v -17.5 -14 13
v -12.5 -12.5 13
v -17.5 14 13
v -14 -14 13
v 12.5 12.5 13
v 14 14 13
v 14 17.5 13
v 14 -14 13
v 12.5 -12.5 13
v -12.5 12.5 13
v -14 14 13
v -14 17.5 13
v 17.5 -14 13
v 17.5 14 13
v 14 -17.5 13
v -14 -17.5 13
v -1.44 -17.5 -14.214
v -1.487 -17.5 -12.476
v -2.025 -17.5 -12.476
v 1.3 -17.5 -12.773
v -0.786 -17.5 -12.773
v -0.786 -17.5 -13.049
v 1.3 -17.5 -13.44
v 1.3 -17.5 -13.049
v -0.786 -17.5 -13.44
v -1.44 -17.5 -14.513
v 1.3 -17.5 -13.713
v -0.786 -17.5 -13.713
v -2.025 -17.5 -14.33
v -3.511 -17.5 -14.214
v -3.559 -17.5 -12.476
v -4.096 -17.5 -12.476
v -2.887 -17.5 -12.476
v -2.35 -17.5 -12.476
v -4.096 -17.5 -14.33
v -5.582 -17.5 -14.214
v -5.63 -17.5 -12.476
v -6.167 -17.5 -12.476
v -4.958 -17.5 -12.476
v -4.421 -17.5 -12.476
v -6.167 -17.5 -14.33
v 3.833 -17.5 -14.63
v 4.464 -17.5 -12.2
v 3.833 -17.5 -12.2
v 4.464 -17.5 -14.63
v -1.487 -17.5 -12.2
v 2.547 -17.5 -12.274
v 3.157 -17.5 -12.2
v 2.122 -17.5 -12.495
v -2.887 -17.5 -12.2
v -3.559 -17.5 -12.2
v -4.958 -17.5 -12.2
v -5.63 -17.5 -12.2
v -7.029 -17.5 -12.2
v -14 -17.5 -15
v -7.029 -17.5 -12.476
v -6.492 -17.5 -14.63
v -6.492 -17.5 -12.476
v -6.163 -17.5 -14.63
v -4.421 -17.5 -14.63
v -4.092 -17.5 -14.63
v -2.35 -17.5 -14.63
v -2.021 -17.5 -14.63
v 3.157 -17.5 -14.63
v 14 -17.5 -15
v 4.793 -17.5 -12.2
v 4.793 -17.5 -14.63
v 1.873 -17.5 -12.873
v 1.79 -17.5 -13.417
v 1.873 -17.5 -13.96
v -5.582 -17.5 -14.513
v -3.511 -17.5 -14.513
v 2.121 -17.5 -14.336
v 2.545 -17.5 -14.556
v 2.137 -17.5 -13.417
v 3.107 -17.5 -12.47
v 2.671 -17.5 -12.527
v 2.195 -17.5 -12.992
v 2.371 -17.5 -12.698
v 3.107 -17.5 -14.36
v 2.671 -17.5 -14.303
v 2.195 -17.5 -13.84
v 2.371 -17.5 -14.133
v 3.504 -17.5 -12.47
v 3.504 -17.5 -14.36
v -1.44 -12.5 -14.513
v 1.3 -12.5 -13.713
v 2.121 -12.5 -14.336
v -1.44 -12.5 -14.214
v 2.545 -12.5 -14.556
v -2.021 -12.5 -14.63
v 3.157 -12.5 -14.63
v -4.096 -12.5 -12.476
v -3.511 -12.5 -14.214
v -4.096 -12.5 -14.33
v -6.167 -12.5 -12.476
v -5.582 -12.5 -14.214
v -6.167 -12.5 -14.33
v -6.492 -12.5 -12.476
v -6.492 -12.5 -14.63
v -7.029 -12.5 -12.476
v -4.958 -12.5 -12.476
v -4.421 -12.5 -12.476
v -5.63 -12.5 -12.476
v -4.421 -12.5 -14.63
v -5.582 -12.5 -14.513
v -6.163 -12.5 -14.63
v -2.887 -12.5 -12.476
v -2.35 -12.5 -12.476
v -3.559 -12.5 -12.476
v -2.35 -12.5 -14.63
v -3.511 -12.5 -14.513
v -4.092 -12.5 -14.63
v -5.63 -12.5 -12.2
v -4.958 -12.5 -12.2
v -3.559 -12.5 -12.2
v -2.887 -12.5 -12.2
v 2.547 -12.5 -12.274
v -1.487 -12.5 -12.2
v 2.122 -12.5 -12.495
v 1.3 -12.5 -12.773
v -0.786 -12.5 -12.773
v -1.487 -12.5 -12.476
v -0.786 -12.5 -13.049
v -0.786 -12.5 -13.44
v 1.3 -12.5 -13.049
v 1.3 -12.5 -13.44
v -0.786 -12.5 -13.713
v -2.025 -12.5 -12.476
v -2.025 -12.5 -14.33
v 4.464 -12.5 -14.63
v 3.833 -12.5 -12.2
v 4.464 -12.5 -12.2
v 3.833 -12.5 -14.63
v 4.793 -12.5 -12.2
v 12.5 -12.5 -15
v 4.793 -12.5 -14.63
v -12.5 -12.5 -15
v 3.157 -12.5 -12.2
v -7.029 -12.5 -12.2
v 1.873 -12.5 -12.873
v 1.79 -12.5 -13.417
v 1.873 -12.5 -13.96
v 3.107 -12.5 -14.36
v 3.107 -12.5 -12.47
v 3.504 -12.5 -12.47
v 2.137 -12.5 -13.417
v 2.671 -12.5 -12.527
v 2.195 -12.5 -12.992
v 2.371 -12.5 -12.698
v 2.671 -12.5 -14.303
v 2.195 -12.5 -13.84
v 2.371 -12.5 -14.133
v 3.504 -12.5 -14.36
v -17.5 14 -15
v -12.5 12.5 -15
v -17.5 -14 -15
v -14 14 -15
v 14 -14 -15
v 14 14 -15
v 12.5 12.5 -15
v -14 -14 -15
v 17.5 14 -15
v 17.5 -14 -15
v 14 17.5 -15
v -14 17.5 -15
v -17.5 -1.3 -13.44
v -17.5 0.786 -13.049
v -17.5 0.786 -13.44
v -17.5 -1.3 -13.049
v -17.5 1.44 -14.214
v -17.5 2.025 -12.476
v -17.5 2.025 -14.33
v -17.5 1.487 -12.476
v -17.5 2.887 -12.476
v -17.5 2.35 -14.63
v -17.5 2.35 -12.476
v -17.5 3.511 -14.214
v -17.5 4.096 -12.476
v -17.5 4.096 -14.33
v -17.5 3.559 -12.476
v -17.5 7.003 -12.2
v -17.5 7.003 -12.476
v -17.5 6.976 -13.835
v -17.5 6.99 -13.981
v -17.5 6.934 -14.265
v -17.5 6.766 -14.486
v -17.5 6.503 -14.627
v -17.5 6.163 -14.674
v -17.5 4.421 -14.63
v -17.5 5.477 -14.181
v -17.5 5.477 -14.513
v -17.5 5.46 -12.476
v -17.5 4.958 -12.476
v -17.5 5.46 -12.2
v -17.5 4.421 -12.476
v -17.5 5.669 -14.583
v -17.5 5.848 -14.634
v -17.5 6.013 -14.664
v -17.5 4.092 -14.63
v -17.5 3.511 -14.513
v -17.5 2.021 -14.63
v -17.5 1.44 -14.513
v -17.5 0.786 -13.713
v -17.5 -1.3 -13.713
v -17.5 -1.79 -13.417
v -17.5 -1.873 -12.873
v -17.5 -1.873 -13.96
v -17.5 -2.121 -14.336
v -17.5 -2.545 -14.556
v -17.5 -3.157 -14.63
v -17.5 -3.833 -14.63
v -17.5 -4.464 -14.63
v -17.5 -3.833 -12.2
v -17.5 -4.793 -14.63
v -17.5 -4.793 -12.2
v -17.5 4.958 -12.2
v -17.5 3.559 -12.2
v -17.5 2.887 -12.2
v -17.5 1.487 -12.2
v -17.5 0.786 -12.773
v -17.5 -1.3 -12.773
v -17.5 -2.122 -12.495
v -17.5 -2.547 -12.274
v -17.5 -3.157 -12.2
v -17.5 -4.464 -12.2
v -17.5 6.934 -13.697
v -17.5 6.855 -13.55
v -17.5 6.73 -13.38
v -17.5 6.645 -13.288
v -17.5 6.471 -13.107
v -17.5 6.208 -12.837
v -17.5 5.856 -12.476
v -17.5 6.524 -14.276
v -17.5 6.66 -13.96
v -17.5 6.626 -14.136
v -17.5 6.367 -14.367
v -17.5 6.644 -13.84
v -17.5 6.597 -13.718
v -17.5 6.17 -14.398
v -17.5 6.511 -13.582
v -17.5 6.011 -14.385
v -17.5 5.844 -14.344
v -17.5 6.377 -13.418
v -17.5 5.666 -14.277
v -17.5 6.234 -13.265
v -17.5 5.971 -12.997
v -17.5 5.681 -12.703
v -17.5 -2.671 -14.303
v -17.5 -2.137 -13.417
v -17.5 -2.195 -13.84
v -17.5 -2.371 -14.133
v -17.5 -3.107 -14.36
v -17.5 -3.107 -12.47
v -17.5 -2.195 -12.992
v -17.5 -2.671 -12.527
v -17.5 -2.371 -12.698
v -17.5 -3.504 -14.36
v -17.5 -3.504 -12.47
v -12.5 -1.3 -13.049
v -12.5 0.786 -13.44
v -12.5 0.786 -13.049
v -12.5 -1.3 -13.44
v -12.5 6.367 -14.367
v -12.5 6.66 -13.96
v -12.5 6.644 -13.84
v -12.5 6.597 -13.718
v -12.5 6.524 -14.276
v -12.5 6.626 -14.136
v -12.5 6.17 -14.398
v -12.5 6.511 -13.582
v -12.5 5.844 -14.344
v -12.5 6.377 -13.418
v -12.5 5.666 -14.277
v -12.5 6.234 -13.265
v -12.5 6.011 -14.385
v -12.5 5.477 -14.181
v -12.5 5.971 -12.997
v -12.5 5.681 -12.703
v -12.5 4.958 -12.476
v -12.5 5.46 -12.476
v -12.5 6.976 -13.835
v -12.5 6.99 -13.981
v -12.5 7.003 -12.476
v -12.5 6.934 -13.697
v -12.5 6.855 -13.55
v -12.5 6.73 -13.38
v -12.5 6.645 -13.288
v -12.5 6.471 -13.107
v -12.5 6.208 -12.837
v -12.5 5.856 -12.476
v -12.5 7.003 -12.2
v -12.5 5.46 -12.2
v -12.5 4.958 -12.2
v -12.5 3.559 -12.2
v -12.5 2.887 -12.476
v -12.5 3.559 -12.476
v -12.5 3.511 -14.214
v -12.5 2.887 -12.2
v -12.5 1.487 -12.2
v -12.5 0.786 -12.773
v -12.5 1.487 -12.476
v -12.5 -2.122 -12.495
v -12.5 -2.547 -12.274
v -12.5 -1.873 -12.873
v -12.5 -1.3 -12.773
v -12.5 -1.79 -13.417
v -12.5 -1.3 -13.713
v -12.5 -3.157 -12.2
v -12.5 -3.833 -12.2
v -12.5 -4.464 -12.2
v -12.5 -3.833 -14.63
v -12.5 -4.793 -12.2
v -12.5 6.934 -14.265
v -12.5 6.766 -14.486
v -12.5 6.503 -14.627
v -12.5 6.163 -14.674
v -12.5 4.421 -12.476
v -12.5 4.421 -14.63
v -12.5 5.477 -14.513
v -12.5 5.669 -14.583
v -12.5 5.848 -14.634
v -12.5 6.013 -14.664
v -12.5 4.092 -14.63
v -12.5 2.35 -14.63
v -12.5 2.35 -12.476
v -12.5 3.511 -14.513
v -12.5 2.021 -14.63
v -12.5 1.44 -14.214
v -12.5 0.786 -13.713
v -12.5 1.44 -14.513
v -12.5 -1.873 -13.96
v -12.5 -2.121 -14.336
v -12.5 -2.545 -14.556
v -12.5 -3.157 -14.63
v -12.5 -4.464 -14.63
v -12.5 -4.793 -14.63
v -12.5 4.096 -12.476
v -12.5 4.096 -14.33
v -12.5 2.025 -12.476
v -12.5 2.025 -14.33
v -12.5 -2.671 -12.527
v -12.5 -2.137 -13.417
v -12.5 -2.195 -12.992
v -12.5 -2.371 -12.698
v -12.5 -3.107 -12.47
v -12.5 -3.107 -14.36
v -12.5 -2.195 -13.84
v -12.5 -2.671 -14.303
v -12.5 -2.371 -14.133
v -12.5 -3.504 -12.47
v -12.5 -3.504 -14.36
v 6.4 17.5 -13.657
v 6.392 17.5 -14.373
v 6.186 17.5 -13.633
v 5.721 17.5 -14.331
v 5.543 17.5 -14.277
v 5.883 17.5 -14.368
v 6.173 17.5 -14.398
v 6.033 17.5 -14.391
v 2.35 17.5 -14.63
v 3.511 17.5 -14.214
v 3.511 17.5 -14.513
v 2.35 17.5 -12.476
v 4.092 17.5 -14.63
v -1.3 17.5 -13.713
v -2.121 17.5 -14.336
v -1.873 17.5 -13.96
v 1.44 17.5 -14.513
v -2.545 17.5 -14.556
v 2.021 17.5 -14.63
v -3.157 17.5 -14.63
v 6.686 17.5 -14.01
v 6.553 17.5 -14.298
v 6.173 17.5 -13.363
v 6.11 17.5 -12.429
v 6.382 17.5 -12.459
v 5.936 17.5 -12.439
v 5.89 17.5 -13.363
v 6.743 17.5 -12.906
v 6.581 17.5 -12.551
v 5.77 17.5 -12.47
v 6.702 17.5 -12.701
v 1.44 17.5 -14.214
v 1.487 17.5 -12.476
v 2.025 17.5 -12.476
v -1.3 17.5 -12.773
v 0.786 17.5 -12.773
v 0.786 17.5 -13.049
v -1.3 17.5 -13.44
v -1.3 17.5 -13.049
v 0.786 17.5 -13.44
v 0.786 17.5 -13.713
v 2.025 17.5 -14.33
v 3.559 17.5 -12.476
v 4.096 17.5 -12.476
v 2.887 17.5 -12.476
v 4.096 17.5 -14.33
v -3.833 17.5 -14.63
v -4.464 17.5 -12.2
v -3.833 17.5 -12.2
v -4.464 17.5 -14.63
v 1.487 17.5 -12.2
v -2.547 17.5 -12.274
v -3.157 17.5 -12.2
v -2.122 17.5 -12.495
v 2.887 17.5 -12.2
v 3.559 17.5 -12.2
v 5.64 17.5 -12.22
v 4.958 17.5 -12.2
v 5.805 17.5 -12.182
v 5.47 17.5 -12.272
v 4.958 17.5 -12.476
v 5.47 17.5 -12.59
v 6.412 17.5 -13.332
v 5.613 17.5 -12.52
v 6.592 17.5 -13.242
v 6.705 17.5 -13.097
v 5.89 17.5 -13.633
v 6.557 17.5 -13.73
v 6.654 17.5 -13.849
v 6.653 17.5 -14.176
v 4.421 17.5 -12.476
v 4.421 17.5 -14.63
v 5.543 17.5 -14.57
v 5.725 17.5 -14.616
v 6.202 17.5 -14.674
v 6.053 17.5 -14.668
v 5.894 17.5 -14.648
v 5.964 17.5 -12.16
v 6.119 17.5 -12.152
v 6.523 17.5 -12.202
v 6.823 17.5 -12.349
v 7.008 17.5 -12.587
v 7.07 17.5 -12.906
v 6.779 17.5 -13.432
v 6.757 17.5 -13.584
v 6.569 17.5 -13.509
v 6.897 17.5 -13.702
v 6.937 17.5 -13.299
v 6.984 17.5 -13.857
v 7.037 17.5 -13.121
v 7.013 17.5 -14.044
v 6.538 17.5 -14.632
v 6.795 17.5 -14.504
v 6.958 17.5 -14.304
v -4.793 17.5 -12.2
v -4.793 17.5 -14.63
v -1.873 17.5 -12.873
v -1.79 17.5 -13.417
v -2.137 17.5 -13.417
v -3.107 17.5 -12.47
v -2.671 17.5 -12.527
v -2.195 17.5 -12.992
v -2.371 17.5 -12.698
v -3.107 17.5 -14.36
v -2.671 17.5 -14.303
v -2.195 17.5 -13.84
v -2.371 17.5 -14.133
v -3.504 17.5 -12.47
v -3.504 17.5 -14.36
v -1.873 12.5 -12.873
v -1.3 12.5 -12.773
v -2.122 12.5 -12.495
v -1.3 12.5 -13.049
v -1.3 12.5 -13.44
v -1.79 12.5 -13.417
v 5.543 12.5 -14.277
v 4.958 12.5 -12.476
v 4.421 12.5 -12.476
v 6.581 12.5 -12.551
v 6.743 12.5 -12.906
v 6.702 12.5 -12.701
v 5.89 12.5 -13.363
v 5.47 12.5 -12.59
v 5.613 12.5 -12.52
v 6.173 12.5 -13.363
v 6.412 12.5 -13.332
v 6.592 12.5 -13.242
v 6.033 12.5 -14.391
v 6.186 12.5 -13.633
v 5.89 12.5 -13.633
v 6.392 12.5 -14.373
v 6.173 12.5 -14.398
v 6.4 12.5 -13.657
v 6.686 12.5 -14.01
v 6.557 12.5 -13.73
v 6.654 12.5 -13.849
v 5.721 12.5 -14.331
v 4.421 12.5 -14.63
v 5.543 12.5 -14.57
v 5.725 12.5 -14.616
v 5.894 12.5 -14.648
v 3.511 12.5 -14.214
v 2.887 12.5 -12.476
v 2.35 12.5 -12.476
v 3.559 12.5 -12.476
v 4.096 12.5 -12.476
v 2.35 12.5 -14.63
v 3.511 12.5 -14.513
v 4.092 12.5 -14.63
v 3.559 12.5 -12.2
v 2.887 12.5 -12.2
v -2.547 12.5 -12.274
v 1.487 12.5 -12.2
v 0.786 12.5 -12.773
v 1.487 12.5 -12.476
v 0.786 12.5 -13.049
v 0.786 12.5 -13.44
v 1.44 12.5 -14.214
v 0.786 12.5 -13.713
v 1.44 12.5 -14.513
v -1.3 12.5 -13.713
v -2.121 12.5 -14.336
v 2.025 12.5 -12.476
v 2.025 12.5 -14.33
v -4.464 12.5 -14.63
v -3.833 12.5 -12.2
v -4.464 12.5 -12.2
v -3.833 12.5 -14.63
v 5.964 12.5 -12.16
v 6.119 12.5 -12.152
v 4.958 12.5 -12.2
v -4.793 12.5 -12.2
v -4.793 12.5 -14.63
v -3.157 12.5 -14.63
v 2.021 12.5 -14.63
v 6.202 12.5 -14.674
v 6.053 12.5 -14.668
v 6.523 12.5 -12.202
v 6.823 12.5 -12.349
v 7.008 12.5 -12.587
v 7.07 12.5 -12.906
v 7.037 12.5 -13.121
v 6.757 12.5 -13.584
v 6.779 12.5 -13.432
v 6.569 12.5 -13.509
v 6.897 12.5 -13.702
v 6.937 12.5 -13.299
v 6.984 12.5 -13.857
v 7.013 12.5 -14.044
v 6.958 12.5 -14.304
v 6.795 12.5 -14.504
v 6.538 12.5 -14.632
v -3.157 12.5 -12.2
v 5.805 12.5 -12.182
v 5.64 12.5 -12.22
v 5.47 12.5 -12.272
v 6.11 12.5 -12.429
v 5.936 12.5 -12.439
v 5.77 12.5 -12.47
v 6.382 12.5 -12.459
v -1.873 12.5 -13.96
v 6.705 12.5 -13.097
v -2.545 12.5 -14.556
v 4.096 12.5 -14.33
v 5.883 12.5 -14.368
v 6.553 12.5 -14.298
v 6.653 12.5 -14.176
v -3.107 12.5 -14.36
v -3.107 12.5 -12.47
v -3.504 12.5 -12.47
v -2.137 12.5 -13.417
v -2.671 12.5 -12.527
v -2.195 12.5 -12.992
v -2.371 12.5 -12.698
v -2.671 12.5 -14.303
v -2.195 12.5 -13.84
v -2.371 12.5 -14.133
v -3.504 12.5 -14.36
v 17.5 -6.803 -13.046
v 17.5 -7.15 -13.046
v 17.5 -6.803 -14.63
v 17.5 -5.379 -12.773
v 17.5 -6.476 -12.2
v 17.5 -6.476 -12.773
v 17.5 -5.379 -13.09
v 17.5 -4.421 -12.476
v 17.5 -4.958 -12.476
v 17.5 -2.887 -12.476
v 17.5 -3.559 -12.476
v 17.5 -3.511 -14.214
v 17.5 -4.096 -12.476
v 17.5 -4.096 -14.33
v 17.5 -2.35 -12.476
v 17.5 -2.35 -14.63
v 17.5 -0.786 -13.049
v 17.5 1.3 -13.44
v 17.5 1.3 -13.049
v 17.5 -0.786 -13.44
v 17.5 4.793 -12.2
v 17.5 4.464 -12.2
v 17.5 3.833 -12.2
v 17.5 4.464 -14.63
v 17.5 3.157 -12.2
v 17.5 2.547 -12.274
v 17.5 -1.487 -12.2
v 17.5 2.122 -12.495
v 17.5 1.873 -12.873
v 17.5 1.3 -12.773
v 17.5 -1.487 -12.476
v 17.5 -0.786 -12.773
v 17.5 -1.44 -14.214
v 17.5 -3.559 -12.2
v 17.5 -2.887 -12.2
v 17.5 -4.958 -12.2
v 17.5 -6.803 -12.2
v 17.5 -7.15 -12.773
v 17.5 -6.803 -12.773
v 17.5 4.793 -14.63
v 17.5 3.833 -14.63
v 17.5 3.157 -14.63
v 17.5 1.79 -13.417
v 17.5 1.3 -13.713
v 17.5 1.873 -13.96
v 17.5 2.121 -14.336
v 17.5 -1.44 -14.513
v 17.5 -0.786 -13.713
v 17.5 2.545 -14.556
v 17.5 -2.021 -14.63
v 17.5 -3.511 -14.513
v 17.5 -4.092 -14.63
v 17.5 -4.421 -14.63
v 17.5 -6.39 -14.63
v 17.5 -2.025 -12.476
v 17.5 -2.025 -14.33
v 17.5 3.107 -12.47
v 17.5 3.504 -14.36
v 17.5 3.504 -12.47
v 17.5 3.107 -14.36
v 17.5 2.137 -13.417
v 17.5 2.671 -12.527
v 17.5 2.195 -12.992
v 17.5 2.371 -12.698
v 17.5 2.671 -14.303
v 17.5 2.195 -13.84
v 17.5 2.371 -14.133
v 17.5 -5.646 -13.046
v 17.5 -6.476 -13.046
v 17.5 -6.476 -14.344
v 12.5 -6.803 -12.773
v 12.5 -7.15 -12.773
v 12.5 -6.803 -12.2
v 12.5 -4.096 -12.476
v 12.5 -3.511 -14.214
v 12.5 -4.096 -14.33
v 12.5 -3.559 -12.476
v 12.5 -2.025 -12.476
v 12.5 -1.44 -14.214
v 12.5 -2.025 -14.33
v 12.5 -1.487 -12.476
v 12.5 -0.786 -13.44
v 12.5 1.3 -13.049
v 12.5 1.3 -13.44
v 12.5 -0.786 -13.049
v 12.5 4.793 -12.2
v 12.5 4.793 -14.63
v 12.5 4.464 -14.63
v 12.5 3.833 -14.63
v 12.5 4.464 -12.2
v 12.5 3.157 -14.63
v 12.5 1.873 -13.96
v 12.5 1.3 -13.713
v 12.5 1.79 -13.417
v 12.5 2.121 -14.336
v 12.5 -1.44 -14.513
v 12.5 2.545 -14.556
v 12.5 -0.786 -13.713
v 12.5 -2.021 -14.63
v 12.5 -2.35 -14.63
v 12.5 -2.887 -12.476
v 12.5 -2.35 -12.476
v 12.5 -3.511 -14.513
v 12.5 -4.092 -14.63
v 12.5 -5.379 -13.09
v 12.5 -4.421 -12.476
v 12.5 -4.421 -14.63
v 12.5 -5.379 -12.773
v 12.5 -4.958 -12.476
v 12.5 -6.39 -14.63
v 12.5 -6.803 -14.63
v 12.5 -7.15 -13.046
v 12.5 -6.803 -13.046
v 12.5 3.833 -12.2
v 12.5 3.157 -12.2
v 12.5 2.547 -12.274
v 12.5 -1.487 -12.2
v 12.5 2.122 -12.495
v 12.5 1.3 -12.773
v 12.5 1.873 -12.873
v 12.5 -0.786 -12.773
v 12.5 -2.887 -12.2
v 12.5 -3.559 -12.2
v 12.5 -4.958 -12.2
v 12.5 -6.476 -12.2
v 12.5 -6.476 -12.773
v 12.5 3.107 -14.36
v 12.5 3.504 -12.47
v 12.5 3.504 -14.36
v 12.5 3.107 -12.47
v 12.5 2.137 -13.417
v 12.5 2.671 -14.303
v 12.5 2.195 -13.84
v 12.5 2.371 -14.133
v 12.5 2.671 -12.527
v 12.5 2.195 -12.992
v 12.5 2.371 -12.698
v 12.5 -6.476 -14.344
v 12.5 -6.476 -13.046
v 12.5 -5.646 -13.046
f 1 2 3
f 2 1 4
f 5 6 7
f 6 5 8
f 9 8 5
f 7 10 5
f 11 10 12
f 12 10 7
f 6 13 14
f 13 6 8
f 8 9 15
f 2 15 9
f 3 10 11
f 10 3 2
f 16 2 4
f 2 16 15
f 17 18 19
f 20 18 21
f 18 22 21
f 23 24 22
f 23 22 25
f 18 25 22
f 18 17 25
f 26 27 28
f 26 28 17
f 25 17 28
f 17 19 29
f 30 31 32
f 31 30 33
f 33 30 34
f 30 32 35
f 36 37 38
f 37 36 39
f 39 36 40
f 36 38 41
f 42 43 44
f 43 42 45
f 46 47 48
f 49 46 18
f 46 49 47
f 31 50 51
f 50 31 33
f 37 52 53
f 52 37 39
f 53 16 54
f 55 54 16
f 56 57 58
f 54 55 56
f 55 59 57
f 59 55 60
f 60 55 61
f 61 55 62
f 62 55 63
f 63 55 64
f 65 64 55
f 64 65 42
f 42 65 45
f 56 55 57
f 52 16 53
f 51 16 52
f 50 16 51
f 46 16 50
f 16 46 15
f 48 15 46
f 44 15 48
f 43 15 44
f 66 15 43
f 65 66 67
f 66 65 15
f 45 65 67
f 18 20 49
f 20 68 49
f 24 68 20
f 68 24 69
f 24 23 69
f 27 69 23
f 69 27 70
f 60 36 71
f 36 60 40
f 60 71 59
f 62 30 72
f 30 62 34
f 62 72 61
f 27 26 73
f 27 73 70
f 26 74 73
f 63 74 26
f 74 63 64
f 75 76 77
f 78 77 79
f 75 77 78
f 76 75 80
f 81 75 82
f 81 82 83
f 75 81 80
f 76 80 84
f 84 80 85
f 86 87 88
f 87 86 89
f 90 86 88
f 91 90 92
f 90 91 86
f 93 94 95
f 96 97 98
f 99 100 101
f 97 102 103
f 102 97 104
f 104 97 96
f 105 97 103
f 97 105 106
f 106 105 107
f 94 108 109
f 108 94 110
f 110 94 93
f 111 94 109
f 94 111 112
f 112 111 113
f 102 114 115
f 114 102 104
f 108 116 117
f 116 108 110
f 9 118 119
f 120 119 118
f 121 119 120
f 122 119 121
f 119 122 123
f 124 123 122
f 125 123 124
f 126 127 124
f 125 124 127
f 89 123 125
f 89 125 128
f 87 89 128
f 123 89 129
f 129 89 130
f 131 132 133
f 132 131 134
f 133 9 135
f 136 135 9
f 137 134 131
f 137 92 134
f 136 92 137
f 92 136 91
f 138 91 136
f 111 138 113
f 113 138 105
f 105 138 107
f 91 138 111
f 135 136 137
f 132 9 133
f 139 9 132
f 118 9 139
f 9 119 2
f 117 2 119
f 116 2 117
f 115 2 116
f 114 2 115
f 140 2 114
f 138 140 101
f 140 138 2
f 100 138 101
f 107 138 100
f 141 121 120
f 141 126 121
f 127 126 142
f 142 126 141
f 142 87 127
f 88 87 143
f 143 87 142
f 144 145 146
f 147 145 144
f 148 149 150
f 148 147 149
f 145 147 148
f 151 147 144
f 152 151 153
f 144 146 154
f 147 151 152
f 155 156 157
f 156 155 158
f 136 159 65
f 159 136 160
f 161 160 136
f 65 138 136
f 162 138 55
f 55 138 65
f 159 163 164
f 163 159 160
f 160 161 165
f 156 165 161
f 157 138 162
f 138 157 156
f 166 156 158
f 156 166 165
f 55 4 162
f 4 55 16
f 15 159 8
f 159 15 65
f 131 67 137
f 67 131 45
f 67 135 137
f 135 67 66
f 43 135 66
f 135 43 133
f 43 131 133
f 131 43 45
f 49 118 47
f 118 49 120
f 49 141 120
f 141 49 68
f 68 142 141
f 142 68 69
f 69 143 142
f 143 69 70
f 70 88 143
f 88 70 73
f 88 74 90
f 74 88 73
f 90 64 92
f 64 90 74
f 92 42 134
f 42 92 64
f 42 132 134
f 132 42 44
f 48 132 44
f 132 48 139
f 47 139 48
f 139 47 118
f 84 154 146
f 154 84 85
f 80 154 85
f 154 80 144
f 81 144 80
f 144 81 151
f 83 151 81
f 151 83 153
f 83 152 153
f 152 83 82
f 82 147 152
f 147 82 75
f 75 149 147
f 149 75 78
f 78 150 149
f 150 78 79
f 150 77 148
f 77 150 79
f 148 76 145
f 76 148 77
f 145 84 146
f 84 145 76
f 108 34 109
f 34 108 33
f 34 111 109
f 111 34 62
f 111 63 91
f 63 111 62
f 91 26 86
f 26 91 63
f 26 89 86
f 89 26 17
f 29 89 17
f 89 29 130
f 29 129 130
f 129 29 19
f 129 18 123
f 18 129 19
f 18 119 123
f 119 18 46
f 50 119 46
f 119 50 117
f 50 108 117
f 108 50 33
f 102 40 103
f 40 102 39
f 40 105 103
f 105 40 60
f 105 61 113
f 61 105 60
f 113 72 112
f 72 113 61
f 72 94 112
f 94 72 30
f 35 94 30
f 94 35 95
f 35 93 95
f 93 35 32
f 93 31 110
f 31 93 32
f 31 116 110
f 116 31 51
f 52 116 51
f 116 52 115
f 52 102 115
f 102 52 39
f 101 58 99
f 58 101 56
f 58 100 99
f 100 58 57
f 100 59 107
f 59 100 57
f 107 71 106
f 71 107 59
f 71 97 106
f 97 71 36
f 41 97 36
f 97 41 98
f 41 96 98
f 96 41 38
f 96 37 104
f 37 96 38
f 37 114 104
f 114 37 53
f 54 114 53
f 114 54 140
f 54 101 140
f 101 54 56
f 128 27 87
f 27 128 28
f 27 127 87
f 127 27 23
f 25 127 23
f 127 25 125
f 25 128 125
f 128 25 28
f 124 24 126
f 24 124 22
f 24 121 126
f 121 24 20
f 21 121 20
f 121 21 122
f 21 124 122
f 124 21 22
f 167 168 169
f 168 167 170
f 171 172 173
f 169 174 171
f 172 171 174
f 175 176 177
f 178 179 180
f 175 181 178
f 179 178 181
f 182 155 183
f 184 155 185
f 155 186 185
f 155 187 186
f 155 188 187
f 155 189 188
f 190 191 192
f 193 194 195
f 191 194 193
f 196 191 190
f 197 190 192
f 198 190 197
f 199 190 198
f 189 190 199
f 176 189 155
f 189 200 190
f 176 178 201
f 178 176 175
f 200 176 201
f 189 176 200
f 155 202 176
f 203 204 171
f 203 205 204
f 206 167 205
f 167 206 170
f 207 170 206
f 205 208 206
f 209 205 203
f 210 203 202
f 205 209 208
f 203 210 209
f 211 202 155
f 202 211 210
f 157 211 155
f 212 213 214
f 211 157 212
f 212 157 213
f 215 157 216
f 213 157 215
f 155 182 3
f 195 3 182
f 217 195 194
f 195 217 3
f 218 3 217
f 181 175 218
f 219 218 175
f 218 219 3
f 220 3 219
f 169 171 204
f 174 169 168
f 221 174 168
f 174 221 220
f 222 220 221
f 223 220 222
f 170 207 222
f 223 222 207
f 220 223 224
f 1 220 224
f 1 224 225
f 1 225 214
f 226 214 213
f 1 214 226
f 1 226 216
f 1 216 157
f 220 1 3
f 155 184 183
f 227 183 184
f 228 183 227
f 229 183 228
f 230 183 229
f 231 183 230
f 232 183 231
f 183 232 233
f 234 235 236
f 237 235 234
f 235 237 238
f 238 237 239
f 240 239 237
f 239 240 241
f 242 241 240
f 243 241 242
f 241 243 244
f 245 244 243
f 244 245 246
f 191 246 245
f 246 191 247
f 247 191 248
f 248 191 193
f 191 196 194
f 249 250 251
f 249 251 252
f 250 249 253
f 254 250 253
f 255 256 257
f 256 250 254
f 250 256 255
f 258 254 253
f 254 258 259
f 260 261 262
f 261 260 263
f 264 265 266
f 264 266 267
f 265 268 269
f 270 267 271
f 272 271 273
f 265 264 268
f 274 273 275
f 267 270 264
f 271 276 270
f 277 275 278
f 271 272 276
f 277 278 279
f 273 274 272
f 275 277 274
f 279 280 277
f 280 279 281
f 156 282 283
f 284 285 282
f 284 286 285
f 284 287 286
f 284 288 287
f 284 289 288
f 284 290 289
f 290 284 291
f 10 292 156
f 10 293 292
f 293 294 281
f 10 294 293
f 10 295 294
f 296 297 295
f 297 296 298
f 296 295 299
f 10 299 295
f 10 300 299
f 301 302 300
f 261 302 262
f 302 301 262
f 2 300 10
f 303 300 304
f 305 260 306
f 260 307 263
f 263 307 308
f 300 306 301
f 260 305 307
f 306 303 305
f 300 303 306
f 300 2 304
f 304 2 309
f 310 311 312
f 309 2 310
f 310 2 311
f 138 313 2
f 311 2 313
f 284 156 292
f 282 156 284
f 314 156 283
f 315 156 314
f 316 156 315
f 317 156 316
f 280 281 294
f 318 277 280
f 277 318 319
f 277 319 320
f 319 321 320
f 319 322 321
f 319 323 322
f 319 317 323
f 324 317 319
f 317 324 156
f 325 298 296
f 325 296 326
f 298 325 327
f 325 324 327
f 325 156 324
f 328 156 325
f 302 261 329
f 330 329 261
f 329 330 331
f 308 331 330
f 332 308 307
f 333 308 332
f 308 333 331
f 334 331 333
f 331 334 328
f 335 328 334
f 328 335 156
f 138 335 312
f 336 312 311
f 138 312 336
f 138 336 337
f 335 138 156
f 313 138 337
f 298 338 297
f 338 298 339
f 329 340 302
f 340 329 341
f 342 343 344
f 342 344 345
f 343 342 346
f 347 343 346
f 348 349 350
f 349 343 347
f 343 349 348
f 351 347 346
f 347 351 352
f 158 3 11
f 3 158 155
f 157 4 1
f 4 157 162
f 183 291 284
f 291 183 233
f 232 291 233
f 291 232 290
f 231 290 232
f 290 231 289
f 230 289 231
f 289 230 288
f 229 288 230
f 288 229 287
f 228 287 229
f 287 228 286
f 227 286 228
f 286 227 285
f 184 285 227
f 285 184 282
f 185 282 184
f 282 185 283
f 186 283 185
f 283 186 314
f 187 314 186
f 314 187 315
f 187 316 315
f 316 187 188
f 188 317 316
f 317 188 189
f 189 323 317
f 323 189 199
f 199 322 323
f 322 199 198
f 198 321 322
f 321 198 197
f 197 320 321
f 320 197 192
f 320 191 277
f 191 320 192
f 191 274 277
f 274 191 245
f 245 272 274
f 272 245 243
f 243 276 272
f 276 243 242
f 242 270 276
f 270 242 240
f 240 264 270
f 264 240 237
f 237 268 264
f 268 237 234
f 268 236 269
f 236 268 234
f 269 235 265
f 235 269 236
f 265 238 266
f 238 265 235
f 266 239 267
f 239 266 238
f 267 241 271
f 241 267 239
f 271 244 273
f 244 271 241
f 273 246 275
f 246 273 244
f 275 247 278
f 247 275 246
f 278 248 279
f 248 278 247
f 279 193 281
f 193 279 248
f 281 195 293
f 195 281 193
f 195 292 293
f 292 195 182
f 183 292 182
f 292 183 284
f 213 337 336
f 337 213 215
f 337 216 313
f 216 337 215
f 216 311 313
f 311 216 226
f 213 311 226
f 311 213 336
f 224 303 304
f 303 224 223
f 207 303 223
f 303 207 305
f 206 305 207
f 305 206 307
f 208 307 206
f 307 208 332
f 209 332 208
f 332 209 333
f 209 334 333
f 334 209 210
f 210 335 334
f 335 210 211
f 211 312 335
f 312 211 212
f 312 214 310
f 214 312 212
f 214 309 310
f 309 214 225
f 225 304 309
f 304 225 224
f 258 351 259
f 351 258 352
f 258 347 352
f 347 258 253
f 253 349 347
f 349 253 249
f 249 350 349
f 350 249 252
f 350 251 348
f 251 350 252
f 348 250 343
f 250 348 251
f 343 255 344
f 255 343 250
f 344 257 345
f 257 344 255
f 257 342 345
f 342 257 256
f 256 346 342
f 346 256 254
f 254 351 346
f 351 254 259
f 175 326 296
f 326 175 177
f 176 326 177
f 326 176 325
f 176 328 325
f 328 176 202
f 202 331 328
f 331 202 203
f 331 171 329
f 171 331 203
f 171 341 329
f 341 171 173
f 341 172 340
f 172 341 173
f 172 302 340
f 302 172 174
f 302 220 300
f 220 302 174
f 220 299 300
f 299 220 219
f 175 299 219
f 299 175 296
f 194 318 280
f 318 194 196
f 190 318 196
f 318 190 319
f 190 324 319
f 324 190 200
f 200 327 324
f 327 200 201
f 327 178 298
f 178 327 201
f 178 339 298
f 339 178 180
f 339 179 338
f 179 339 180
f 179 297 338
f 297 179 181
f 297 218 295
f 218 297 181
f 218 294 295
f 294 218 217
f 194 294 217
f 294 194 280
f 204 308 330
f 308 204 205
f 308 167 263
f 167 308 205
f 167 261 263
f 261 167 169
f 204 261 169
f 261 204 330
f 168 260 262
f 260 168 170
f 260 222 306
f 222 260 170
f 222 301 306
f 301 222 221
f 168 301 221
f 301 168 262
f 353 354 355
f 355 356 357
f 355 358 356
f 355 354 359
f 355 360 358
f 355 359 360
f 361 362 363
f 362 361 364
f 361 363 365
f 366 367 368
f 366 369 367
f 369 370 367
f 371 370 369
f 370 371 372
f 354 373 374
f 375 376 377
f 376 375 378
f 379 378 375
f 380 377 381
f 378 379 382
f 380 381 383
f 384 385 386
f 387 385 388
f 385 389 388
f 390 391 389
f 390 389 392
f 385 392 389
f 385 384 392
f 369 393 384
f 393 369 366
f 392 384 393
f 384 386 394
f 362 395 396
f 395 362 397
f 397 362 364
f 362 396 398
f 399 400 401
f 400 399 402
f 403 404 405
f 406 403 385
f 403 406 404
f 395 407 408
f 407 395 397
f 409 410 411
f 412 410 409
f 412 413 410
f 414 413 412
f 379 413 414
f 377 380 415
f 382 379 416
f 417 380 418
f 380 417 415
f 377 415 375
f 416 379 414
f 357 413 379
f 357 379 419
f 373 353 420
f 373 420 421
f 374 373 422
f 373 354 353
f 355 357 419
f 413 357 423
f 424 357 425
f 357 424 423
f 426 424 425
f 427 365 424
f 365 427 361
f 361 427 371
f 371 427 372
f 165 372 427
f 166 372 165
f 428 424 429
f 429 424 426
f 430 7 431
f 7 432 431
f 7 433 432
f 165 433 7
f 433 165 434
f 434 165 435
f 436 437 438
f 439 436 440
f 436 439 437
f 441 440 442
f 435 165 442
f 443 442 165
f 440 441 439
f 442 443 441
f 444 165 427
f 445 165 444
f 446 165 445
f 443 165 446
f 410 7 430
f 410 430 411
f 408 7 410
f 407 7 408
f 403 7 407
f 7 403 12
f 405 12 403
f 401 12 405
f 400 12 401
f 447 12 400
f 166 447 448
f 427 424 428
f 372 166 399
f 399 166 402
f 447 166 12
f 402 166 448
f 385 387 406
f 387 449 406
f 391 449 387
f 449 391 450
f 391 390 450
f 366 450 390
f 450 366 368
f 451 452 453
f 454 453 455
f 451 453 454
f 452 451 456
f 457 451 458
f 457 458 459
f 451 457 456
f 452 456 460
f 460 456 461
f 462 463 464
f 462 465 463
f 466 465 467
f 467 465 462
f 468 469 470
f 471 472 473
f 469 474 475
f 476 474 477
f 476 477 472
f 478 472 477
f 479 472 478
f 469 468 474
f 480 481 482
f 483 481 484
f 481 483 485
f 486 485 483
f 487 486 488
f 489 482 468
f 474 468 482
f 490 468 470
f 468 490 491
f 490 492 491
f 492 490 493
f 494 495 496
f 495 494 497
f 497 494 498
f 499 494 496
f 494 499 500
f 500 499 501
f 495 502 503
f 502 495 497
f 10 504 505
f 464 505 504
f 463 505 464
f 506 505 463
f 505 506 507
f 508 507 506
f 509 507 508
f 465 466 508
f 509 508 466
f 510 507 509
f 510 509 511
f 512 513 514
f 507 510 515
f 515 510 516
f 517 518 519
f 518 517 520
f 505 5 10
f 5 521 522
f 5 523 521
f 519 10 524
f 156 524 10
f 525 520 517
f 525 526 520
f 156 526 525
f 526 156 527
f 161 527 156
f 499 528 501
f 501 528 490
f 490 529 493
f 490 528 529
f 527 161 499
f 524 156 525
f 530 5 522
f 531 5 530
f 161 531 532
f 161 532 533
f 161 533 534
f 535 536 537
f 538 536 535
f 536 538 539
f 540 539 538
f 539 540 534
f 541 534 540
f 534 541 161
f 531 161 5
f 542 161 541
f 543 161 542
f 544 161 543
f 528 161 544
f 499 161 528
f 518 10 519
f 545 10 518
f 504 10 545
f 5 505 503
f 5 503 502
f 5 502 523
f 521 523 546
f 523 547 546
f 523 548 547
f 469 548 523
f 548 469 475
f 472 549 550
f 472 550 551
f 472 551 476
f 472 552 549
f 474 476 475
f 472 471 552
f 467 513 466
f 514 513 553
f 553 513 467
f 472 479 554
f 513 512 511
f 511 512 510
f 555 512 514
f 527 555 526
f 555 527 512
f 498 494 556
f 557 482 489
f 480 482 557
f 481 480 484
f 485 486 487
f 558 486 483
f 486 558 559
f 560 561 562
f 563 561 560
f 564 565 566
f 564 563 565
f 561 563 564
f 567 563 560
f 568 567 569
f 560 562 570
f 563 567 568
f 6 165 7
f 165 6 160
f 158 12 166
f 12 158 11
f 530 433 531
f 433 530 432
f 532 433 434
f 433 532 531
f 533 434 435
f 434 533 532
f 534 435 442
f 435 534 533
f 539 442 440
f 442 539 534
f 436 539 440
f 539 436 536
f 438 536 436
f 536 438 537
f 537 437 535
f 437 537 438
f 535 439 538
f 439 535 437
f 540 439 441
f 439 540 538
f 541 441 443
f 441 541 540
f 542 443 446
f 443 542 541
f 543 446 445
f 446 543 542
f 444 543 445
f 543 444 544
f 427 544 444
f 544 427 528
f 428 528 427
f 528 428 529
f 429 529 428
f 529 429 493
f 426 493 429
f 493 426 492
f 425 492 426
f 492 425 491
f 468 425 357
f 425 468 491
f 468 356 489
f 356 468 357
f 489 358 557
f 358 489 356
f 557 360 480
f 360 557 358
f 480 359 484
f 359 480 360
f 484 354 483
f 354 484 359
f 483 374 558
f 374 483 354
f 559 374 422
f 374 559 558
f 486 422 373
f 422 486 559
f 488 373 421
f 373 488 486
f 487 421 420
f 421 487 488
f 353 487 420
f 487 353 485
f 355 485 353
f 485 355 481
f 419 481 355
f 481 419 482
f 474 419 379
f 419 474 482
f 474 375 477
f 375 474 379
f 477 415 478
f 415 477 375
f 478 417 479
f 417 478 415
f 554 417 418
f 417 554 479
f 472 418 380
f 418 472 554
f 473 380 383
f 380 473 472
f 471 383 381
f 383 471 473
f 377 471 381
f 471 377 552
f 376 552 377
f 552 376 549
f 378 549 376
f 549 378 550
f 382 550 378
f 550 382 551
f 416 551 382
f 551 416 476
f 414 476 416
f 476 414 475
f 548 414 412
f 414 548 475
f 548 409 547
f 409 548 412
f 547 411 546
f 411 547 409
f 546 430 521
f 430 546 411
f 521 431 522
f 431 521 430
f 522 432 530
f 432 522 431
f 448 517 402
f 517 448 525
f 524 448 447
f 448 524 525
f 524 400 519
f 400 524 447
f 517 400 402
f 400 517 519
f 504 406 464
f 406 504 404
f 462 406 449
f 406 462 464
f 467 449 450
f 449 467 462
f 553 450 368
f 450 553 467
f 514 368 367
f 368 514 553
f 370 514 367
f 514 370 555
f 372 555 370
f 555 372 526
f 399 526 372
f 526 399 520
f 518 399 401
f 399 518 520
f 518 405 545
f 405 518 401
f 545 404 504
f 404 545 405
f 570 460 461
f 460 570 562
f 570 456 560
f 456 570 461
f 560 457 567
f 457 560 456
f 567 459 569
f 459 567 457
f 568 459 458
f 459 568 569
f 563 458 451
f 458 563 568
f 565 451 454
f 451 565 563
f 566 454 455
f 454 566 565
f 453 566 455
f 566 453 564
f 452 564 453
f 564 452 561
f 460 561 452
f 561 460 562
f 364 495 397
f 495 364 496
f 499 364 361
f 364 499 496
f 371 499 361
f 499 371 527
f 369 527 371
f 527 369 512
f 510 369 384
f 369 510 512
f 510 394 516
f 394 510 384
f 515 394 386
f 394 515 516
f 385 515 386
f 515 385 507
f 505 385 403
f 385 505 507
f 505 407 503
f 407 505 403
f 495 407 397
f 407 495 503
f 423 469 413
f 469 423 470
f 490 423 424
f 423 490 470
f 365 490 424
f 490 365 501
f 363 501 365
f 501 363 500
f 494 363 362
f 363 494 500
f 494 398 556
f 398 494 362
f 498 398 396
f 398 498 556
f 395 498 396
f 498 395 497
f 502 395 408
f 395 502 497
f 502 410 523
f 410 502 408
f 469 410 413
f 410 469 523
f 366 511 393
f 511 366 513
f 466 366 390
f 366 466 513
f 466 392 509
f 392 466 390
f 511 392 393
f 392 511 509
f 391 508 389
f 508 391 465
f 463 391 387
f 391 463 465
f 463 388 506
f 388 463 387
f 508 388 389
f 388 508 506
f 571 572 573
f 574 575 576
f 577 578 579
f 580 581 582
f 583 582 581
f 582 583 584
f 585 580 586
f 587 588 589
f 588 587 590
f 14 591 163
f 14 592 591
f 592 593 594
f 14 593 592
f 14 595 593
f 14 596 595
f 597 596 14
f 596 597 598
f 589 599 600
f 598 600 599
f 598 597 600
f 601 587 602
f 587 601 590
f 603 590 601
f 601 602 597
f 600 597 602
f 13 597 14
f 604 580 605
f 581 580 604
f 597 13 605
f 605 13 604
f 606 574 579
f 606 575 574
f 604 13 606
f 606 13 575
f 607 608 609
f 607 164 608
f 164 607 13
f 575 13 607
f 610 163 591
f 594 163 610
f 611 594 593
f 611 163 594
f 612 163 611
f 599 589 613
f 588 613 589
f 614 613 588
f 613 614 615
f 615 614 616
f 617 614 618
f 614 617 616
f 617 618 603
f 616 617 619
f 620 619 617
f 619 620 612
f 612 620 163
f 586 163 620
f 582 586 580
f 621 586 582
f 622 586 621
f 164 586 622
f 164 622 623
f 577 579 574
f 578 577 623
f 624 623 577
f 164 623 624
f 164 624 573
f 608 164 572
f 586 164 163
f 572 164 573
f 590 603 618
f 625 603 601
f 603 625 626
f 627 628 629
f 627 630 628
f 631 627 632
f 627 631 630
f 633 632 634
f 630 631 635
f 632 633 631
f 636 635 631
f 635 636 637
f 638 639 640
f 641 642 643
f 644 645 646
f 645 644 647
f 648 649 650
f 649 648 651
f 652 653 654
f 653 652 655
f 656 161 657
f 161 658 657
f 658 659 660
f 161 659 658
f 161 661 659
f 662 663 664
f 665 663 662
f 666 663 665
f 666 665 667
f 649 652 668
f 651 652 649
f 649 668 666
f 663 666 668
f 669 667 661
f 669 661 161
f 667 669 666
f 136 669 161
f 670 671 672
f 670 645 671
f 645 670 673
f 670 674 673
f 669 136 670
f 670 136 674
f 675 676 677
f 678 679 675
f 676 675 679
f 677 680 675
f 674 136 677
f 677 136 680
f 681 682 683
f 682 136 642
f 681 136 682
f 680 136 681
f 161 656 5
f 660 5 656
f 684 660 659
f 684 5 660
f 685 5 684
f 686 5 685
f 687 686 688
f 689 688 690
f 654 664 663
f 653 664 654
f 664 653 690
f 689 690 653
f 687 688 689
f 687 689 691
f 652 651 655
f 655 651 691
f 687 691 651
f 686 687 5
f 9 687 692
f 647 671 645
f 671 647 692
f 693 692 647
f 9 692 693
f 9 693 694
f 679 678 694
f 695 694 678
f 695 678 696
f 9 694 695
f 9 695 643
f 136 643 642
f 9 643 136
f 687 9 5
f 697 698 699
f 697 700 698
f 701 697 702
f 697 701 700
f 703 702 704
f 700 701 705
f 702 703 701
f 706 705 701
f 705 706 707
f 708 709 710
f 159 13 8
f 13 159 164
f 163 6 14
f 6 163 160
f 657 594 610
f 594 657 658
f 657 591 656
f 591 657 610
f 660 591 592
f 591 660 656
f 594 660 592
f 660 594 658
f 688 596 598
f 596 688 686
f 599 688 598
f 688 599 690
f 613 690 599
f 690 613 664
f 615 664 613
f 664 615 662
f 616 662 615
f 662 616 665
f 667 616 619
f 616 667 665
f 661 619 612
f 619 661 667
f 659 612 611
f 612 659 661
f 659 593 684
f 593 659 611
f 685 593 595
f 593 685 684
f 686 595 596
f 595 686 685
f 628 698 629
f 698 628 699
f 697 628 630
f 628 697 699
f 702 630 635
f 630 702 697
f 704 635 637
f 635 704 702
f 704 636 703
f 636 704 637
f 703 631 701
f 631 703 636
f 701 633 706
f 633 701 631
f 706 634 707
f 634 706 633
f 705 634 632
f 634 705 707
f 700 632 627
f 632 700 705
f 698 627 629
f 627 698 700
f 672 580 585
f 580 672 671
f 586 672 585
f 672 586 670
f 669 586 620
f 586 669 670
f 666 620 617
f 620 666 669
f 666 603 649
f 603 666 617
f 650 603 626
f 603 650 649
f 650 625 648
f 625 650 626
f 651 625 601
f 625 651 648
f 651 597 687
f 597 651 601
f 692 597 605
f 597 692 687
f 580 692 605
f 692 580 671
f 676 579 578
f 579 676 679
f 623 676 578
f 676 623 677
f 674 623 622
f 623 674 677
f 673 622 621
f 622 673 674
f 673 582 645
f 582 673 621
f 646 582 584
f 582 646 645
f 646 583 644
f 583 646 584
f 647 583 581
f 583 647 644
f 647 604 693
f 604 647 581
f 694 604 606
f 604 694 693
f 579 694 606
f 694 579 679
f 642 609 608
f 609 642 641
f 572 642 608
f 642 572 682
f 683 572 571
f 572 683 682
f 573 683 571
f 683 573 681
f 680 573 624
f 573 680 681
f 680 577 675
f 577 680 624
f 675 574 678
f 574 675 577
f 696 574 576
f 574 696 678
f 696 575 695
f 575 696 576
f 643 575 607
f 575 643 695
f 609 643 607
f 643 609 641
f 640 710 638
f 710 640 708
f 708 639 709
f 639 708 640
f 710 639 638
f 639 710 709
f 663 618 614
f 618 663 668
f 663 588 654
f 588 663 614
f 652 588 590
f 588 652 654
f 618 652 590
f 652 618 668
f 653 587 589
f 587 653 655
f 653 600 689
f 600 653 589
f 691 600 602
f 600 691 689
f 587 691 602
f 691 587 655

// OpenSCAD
// file: modules.scad
offset = [0,8,0];
zoom = [0.8,0.8,1];

module white( filename, text)
{
    translate(offset+[0,-4,0])   scale(zoom)
    rotate([180,0,-90]) 
    union(){ 
        translate([-14,-6.4,-2.5])   rotate([0,0,90])  linear_extrude(5)  text (text,font="bold",size=3); 
        intersection() 
        {    
            cube([35,35,5],center=true); 
            translate([1.5,0,2.6])   linear_extrude(5) scale([0.14,0.14,-1])surface(file = filename, center = true); 
        } 
    } 

};

module black( filename, text)
{
    translate(offset+[0,-4,0])   scale(zoom)
    rotate([180,0,-90]) 
    difference() 
    {    
        cube([35,35,5],center=true); 
        translate([1.5,0,2.6])    scale([0.14,0.14,-1]) surface(file = filename, center = true);
        translate([-14,-6.4,-2.5])   rotate([0,0,90])  linear_extrude(6)  text (text,font="bold",size=3);
    } 
}

module shape()
{
    translate(offset)   scale(zoom) rotate([180,0,0]) 
    {
        rotate([0,0,90]) translate([5,0,0])  cube([35,35,5.5],center=true);  
        linear_extrude(5)  translate([-9,-4,0])   text("B",size=20);
    }
    
}
// main file
include <modules.scad>


    union() color([0,1,0]) translate([0,0,-1]) rotate([-90,0,0])
    {
        translate([0,-4,-15])                     black("../aruco/Marker111.png","ID=111");
        rotate([0,90,0])   translate([0,-4,-15])  black("../aruco/Marker112.png","ID=112");
        rotate([0,180,0])   translate([0,-4,-15]) black("../aruco/Marker113.png","ID=113");
        rotate([0,270,0])   translate([0,-4,-15]) black("../aruco/Marker114.png","ID=114");
    }    
